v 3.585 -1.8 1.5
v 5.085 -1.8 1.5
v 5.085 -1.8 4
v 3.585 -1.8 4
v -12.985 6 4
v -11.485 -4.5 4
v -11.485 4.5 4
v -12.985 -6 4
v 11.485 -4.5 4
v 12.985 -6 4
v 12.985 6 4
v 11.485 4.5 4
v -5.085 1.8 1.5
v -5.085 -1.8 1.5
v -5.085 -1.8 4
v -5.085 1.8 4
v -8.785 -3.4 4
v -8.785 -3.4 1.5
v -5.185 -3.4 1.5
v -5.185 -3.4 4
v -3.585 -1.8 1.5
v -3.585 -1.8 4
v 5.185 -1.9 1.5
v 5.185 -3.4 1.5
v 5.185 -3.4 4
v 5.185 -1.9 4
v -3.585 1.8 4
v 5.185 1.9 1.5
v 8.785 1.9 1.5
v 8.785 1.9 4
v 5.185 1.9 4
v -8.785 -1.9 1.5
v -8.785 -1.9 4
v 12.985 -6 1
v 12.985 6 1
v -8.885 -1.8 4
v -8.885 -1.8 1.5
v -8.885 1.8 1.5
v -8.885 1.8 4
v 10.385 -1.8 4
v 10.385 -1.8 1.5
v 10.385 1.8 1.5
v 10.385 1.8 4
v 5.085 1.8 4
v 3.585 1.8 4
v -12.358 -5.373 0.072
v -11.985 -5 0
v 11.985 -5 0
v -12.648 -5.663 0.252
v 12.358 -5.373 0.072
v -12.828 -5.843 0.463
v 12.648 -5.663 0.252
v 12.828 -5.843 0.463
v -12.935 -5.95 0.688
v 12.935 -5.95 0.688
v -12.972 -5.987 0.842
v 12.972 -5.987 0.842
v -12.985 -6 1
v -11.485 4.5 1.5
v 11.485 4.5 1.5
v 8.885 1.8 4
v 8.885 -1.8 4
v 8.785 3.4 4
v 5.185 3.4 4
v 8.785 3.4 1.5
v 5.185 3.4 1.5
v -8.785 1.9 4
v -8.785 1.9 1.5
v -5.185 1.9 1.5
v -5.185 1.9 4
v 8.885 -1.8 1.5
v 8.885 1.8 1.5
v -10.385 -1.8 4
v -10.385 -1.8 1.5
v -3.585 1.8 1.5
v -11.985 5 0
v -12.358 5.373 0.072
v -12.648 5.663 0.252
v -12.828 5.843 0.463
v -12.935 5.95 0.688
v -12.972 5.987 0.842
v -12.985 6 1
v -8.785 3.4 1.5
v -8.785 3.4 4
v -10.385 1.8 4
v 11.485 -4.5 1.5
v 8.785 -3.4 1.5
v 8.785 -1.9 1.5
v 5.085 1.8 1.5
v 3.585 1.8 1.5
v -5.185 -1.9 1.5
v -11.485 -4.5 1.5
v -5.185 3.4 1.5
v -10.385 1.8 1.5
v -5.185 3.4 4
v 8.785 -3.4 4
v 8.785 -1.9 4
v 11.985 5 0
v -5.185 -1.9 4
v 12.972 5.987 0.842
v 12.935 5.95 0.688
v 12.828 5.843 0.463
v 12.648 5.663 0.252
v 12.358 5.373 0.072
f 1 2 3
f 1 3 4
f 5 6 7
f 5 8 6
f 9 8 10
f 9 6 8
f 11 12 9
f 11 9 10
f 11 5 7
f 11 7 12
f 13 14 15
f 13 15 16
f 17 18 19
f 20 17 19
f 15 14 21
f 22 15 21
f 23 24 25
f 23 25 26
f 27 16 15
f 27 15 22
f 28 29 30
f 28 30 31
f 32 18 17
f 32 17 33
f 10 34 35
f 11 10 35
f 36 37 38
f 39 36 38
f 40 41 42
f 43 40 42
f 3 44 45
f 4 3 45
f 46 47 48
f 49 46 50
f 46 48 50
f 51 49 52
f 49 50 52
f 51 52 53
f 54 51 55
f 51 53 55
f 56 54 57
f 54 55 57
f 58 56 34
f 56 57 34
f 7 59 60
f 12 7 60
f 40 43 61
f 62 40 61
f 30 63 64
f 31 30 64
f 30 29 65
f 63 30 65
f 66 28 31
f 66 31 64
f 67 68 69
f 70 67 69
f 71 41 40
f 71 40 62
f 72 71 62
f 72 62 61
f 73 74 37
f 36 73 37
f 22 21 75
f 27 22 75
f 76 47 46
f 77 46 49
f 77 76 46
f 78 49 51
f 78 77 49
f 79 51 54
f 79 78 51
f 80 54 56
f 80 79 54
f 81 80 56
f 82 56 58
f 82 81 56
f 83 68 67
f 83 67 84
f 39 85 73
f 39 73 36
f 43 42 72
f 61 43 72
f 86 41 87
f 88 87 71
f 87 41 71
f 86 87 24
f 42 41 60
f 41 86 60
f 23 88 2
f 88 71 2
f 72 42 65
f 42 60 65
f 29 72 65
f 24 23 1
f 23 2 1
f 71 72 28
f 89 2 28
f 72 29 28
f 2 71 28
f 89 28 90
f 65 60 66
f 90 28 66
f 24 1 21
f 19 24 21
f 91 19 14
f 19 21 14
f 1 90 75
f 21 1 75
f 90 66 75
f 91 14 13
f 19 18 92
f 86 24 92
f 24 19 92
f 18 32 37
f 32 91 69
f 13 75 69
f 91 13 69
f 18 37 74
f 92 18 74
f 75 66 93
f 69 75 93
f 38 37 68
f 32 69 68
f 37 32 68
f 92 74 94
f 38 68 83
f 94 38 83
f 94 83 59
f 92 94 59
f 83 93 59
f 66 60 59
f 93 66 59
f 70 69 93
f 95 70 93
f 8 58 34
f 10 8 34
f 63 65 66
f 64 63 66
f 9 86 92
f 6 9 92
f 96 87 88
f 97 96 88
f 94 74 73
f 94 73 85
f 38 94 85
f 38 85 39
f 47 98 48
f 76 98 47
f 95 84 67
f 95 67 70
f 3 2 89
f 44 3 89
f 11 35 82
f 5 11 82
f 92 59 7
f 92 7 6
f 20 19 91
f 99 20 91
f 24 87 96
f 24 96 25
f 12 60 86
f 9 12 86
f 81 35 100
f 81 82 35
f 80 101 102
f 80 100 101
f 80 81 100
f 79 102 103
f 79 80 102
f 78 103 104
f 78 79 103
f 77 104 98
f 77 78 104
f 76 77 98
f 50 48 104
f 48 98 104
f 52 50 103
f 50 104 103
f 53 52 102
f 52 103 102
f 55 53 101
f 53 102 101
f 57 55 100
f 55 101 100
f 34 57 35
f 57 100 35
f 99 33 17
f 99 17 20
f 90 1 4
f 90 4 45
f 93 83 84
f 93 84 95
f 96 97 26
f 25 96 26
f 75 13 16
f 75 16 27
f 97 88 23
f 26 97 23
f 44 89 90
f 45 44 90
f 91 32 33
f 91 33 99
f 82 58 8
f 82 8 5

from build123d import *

# Parameters (mm, degrees)
SKETCH_W      = 12.985
SKETCH_H      = 12
PAD_DEPTH     = 1.5
PAD001_DEPTH  = 2.5
SKETCH002_W   = 3.6
SKETCH002_H   = 1.5
SKETCH002_W_2 = 1.5
SKETCH002_H_2 = 3.6
PAD002_DEPTH  = 4
FILLET_R      = 1


with BuildPart() as part:
    # Sketch → Pad (new body)
    with BuildSketch(Plane.XY):
        with Locations((-6.4925, 0)):
            Rectangle(SKETCH_W, SKETCH_H)
    pad = extrude(amount=PAD_DEPTH)

    # Sketch001 → Pad001 (join)
    with BuildSketch(Plane.XY.offset(1.5)):
        Polygon((-12.985, 6), (0, 6), (0, 4.5), (-11.485, 4.5), (-11.485, -4.5), (0, -4.5), (0, -6), (-12.985, -6), align=None)
    pad001 = extrude(amount=PAD001_DEPTH)

    # Sketch002 → Pad002 (join)
    with BuildSketch(Plane.XY):
        with Locations((-6.985, 2.65)):
            Rectangle(SKETCH002_W, SKETCH002_H)
        with Locations((-6.985, -2.65)):
            Rectangle(SKETCH002_W, SKETCH002_H)
        with Locations((-9.635, 0)):
            Rectangle(SKETCH002_W_2, SKETCH002_H_2)
        with Locations((-4.335, 0)):
            Rectangle(SKETCH002_W_2, SKETCH002_H_2)
    pad002 = extrude(amount=PAD002_DEPTH)

    # Mirrored: Pad across Sketch V_Axis
    add(pad.mirror(Plane(origin=(0, 0, 0), x_dir=(0, 0, 1), z_dir=(1, 0, 0))))

    # Mirrored001: Pad002 across Sketch002 V_Axis
    add(pad002.mirror(Plane(origin=(0, 0, 0), x_dir=(0, 0, 1), z_dir=(1, 0, 0))))

    # Mirrored002: Pad001 across Sketch001 V_Axis
    add(pad001.mirror(Plane(origin=(0, 0, 1.5), x_dir=(0, 0, 1), z_dir=(1, 0, 0))))

    # Fillet
    fillet_edges = [part.edges().sort_by_distance(p)[0] for p in [
        (12.985, 0, 0),
        (0, -6, 0),
        (-12.985, 0, 0),
        (0, 6, 0),
    ]]
    fillet(fillet_edges, radius=FILLET_R)


solid = part.part
